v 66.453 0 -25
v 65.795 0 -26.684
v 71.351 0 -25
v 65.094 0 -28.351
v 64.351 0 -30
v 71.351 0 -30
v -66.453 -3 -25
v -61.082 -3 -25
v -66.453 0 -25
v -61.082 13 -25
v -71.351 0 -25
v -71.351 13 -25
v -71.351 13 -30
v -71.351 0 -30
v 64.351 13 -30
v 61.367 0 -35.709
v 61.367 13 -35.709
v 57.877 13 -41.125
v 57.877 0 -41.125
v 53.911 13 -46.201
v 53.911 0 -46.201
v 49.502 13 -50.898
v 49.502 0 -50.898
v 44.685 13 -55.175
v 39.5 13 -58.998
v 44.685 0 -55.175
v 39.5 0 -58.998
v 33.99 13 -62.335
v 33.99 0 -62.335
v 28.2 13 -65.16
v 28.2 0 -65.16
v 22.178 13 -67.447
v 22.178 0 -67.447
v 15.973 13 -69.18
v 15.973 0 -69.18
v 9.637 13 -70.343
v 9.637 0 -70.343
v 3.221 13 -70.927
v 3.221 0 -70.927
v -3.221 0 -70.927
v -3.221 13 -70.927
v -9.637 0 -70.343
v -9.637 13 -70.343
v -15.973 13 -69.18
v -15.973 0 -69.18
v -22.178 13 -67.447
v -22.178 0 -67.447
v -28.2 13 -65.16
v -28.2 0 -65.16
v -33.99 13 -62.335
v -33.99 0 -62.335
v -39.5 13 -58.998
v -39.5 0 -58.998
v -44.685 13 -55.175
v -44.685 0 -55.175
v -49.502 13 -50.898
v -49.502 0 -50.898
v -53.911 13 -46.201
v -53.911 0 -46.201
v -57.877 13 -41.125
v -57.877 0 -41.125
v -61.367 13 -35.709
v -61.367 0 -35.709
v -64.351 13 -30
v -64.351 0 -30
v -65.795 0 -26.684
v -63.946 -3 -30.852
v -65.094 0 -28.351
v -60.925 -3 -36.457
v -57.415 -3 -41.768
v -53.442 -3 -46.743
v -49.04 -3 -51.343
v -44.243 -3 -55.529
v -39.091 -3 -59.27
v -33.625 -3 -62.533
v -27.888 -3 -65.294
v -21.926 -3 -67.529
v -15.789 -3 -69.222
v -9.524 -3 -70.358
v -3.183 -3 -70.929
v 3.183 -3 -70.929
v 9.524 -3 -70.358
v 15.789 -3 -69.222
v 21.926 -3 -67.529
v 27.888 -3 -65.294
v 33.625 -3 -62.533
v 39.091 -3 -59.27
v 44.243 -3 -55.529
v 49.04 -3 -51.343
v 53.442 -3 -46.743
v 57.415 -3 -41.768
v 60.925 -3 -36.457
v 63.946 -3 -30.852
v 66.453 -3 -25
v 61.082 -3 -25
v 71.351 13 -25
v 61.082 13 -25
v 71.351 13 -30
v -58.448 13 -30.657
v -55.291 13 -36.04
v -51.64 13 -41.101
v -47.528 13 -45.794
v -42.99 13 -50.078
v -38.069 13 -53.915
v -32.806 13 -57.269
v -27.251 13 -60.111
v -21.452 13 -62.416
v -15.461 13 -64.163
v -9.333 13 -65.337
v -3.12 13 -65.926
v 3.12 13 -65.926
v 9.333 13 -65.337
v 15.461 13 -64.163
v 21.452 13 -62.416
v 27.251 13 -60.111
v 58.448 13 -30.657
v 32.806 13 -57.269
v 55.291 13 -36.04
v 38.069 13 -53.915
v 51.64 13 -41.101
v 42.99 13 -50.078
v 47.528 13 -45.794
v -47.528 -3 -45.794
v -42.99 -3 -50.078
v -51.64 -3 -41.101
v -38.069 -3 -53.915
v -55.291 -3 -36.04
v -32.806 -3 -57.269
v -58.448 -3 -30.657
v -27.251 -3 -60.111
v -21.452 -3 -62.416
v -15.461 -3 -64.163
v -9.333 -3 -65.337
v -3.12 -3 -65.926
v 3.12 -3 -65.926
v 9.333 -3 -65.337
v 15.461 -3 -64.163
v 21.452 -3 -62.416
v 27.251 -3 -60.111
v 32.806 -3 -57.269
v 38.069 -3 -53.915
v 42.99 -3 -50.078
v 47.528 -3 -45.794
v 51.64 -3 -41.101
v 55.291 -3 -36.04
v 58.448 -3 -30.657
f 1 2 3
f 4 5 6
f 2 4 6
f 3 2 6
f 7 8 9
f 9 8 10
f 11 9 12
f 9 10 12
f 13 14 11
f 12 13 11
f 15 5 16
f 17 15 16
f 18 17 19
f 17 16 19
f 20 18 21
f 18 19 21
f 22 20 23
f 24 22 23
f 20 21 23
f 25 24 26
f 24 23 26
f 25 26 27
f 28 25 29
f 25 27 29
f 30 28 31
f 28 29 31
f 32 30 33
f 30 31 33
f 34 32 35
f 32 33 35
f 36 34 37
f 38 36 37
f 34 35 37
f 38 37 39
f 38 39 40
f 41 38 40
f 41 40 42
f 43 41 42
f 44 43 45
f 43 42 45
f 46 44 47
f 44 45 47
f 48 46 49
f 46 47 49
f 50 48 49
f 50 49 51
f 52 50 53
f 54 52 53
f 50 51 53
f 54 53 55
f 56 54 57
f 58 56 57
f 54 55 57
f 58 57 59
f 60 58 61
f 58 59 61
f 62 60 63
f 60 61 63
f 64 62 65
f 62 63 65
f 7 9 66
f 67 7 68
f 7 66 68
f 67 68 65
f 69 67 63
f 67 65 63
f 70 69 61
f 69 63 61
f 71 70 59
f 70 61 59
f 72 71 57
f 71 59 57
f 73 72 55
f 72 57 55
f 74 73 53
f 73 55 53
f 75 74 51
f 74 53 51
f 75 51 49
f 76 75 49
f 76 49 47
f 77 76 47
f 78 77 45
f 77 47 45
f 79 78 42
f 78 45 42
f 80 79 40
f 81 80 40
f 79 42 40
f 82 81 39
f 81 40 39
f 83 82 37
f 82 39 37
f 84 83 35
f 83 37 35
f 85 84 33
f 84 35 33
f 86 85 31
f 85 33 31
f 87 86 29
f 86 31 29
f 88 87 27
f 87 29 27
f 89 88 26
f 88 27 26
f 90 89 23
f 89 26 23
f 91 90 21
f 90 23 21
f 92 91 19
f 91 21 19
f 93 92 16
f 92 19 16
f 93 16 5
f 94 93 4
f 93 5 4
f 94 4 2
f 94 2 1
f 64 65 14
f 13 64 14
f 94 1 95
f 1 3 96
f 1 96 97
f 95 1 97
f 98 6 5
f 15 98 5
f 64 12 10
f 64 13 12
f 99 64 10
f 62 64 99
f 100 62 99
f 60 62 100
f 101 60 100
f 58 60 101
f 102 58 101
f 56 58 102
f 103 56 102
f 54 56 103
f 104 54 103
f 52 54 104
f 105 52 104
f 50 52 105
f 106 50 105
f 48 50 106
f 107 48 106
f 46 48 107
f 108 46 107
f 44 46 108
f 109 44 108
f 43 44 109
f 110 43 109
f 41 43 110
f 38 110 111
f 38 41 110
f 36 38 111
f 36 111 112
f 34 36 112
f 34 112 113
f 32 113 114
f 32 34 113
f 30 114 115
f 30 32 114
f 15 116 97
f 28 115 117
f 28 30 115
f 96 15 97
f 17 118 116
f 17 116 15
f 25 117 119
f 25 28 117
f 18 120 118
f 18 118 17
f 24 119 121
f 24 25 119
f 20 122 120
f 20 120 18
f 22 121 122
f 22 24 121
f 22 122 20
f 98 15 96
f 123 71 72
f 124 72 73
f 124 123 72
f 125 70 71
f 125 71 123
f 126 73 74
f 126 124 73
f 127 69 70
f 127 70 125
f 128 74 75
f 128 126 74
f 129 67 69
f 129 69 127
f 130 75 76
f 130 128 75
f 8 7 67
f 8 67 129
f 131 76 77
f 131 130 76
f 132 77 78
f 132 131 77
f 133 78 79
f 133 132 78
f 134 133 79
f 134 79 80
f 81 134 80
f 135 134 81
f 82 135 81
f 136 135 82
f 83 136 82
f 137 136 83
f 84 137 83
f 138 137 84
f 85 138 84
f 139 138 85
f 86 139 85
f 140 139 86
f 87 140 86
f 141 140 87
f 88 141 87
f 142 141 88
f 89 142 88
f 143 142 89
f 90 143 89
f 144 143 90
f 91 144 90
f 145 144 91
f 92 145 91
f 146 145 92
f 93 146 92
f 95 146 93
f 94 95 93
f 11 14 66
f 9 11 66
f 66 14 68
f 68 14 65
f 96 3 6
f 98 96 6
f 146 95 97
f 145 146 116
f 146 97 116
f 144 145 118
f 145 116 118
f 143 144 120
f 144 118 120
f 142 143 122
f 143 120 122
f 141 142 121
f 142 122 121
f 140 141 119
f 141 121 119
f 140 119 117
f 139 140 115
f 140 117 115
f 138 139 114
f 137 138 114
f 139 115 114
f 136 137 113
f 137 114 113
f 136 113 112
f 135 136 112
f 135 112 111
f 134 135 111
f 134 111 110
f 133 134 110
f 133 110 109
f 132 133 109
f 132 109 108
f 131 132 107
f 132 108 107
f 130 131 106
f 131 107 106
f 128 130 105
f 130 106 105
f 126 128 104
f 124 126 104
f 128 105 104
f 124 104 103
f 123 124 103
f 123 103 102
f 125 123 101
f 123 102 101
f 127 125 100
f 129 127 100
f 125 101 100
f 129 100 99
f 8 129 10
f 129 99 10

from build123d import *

# Parameters (mm, degrees)
BOSS_EXTRUDE1_DEPTH = 13
BOSS_EXTRUDE2_DEPTH = 3


with BuildPart() as part:
    # Sketch2 → Boss-Extrude1 (new body)
    with BuildSketch(Plane(origin=(0, 0, 0), x_dir=(1, 0, 0), z_dir=(0, 1, 0))):
        with BuildLine():
            Line((-71.350602173, 25), (-61.081912216, 25))
            ThreePointArc((-61.081912216, 25), (0, 66), (61.081912216, 25))
            Line((61.081912216, 25), (71.350602173, 25))
            Line((71.350602173, 25), (71.350602173, 30))
            Line((71.350602173, 30), (64.350602173, 30))
            ThreePointArc((64.350602173, 30), (0, 71), (-64.350602173, 30))
            Line((-64.350602173, 30), (-71.350602173, 30))
            Line((-71.350602173, 30), (-71.350602173, 25))
        make_face()
    extrude(amount=BOSS_EXTRUDE1_DEPTH)

    # Sketch3 → Boss-Extrude2 (add)
    with BuildSketch(Plane.XZ):
        with BuildLine():
            Line((66.452990903, -25), (61.081912216, -25))
            ThreePointArc((61.081912216, -25), (0, -66), (-61.081912216, -25))
            Line((-61.081912216, -25), (-66.452990903, -25))
            ThreePointArc((-66.452990903, -25), (0, -71), (66.452990903, -25))
        make_face()
    extrude(amount=BOSS_EXTRUDE2_DEPTH)


solid = part.part
